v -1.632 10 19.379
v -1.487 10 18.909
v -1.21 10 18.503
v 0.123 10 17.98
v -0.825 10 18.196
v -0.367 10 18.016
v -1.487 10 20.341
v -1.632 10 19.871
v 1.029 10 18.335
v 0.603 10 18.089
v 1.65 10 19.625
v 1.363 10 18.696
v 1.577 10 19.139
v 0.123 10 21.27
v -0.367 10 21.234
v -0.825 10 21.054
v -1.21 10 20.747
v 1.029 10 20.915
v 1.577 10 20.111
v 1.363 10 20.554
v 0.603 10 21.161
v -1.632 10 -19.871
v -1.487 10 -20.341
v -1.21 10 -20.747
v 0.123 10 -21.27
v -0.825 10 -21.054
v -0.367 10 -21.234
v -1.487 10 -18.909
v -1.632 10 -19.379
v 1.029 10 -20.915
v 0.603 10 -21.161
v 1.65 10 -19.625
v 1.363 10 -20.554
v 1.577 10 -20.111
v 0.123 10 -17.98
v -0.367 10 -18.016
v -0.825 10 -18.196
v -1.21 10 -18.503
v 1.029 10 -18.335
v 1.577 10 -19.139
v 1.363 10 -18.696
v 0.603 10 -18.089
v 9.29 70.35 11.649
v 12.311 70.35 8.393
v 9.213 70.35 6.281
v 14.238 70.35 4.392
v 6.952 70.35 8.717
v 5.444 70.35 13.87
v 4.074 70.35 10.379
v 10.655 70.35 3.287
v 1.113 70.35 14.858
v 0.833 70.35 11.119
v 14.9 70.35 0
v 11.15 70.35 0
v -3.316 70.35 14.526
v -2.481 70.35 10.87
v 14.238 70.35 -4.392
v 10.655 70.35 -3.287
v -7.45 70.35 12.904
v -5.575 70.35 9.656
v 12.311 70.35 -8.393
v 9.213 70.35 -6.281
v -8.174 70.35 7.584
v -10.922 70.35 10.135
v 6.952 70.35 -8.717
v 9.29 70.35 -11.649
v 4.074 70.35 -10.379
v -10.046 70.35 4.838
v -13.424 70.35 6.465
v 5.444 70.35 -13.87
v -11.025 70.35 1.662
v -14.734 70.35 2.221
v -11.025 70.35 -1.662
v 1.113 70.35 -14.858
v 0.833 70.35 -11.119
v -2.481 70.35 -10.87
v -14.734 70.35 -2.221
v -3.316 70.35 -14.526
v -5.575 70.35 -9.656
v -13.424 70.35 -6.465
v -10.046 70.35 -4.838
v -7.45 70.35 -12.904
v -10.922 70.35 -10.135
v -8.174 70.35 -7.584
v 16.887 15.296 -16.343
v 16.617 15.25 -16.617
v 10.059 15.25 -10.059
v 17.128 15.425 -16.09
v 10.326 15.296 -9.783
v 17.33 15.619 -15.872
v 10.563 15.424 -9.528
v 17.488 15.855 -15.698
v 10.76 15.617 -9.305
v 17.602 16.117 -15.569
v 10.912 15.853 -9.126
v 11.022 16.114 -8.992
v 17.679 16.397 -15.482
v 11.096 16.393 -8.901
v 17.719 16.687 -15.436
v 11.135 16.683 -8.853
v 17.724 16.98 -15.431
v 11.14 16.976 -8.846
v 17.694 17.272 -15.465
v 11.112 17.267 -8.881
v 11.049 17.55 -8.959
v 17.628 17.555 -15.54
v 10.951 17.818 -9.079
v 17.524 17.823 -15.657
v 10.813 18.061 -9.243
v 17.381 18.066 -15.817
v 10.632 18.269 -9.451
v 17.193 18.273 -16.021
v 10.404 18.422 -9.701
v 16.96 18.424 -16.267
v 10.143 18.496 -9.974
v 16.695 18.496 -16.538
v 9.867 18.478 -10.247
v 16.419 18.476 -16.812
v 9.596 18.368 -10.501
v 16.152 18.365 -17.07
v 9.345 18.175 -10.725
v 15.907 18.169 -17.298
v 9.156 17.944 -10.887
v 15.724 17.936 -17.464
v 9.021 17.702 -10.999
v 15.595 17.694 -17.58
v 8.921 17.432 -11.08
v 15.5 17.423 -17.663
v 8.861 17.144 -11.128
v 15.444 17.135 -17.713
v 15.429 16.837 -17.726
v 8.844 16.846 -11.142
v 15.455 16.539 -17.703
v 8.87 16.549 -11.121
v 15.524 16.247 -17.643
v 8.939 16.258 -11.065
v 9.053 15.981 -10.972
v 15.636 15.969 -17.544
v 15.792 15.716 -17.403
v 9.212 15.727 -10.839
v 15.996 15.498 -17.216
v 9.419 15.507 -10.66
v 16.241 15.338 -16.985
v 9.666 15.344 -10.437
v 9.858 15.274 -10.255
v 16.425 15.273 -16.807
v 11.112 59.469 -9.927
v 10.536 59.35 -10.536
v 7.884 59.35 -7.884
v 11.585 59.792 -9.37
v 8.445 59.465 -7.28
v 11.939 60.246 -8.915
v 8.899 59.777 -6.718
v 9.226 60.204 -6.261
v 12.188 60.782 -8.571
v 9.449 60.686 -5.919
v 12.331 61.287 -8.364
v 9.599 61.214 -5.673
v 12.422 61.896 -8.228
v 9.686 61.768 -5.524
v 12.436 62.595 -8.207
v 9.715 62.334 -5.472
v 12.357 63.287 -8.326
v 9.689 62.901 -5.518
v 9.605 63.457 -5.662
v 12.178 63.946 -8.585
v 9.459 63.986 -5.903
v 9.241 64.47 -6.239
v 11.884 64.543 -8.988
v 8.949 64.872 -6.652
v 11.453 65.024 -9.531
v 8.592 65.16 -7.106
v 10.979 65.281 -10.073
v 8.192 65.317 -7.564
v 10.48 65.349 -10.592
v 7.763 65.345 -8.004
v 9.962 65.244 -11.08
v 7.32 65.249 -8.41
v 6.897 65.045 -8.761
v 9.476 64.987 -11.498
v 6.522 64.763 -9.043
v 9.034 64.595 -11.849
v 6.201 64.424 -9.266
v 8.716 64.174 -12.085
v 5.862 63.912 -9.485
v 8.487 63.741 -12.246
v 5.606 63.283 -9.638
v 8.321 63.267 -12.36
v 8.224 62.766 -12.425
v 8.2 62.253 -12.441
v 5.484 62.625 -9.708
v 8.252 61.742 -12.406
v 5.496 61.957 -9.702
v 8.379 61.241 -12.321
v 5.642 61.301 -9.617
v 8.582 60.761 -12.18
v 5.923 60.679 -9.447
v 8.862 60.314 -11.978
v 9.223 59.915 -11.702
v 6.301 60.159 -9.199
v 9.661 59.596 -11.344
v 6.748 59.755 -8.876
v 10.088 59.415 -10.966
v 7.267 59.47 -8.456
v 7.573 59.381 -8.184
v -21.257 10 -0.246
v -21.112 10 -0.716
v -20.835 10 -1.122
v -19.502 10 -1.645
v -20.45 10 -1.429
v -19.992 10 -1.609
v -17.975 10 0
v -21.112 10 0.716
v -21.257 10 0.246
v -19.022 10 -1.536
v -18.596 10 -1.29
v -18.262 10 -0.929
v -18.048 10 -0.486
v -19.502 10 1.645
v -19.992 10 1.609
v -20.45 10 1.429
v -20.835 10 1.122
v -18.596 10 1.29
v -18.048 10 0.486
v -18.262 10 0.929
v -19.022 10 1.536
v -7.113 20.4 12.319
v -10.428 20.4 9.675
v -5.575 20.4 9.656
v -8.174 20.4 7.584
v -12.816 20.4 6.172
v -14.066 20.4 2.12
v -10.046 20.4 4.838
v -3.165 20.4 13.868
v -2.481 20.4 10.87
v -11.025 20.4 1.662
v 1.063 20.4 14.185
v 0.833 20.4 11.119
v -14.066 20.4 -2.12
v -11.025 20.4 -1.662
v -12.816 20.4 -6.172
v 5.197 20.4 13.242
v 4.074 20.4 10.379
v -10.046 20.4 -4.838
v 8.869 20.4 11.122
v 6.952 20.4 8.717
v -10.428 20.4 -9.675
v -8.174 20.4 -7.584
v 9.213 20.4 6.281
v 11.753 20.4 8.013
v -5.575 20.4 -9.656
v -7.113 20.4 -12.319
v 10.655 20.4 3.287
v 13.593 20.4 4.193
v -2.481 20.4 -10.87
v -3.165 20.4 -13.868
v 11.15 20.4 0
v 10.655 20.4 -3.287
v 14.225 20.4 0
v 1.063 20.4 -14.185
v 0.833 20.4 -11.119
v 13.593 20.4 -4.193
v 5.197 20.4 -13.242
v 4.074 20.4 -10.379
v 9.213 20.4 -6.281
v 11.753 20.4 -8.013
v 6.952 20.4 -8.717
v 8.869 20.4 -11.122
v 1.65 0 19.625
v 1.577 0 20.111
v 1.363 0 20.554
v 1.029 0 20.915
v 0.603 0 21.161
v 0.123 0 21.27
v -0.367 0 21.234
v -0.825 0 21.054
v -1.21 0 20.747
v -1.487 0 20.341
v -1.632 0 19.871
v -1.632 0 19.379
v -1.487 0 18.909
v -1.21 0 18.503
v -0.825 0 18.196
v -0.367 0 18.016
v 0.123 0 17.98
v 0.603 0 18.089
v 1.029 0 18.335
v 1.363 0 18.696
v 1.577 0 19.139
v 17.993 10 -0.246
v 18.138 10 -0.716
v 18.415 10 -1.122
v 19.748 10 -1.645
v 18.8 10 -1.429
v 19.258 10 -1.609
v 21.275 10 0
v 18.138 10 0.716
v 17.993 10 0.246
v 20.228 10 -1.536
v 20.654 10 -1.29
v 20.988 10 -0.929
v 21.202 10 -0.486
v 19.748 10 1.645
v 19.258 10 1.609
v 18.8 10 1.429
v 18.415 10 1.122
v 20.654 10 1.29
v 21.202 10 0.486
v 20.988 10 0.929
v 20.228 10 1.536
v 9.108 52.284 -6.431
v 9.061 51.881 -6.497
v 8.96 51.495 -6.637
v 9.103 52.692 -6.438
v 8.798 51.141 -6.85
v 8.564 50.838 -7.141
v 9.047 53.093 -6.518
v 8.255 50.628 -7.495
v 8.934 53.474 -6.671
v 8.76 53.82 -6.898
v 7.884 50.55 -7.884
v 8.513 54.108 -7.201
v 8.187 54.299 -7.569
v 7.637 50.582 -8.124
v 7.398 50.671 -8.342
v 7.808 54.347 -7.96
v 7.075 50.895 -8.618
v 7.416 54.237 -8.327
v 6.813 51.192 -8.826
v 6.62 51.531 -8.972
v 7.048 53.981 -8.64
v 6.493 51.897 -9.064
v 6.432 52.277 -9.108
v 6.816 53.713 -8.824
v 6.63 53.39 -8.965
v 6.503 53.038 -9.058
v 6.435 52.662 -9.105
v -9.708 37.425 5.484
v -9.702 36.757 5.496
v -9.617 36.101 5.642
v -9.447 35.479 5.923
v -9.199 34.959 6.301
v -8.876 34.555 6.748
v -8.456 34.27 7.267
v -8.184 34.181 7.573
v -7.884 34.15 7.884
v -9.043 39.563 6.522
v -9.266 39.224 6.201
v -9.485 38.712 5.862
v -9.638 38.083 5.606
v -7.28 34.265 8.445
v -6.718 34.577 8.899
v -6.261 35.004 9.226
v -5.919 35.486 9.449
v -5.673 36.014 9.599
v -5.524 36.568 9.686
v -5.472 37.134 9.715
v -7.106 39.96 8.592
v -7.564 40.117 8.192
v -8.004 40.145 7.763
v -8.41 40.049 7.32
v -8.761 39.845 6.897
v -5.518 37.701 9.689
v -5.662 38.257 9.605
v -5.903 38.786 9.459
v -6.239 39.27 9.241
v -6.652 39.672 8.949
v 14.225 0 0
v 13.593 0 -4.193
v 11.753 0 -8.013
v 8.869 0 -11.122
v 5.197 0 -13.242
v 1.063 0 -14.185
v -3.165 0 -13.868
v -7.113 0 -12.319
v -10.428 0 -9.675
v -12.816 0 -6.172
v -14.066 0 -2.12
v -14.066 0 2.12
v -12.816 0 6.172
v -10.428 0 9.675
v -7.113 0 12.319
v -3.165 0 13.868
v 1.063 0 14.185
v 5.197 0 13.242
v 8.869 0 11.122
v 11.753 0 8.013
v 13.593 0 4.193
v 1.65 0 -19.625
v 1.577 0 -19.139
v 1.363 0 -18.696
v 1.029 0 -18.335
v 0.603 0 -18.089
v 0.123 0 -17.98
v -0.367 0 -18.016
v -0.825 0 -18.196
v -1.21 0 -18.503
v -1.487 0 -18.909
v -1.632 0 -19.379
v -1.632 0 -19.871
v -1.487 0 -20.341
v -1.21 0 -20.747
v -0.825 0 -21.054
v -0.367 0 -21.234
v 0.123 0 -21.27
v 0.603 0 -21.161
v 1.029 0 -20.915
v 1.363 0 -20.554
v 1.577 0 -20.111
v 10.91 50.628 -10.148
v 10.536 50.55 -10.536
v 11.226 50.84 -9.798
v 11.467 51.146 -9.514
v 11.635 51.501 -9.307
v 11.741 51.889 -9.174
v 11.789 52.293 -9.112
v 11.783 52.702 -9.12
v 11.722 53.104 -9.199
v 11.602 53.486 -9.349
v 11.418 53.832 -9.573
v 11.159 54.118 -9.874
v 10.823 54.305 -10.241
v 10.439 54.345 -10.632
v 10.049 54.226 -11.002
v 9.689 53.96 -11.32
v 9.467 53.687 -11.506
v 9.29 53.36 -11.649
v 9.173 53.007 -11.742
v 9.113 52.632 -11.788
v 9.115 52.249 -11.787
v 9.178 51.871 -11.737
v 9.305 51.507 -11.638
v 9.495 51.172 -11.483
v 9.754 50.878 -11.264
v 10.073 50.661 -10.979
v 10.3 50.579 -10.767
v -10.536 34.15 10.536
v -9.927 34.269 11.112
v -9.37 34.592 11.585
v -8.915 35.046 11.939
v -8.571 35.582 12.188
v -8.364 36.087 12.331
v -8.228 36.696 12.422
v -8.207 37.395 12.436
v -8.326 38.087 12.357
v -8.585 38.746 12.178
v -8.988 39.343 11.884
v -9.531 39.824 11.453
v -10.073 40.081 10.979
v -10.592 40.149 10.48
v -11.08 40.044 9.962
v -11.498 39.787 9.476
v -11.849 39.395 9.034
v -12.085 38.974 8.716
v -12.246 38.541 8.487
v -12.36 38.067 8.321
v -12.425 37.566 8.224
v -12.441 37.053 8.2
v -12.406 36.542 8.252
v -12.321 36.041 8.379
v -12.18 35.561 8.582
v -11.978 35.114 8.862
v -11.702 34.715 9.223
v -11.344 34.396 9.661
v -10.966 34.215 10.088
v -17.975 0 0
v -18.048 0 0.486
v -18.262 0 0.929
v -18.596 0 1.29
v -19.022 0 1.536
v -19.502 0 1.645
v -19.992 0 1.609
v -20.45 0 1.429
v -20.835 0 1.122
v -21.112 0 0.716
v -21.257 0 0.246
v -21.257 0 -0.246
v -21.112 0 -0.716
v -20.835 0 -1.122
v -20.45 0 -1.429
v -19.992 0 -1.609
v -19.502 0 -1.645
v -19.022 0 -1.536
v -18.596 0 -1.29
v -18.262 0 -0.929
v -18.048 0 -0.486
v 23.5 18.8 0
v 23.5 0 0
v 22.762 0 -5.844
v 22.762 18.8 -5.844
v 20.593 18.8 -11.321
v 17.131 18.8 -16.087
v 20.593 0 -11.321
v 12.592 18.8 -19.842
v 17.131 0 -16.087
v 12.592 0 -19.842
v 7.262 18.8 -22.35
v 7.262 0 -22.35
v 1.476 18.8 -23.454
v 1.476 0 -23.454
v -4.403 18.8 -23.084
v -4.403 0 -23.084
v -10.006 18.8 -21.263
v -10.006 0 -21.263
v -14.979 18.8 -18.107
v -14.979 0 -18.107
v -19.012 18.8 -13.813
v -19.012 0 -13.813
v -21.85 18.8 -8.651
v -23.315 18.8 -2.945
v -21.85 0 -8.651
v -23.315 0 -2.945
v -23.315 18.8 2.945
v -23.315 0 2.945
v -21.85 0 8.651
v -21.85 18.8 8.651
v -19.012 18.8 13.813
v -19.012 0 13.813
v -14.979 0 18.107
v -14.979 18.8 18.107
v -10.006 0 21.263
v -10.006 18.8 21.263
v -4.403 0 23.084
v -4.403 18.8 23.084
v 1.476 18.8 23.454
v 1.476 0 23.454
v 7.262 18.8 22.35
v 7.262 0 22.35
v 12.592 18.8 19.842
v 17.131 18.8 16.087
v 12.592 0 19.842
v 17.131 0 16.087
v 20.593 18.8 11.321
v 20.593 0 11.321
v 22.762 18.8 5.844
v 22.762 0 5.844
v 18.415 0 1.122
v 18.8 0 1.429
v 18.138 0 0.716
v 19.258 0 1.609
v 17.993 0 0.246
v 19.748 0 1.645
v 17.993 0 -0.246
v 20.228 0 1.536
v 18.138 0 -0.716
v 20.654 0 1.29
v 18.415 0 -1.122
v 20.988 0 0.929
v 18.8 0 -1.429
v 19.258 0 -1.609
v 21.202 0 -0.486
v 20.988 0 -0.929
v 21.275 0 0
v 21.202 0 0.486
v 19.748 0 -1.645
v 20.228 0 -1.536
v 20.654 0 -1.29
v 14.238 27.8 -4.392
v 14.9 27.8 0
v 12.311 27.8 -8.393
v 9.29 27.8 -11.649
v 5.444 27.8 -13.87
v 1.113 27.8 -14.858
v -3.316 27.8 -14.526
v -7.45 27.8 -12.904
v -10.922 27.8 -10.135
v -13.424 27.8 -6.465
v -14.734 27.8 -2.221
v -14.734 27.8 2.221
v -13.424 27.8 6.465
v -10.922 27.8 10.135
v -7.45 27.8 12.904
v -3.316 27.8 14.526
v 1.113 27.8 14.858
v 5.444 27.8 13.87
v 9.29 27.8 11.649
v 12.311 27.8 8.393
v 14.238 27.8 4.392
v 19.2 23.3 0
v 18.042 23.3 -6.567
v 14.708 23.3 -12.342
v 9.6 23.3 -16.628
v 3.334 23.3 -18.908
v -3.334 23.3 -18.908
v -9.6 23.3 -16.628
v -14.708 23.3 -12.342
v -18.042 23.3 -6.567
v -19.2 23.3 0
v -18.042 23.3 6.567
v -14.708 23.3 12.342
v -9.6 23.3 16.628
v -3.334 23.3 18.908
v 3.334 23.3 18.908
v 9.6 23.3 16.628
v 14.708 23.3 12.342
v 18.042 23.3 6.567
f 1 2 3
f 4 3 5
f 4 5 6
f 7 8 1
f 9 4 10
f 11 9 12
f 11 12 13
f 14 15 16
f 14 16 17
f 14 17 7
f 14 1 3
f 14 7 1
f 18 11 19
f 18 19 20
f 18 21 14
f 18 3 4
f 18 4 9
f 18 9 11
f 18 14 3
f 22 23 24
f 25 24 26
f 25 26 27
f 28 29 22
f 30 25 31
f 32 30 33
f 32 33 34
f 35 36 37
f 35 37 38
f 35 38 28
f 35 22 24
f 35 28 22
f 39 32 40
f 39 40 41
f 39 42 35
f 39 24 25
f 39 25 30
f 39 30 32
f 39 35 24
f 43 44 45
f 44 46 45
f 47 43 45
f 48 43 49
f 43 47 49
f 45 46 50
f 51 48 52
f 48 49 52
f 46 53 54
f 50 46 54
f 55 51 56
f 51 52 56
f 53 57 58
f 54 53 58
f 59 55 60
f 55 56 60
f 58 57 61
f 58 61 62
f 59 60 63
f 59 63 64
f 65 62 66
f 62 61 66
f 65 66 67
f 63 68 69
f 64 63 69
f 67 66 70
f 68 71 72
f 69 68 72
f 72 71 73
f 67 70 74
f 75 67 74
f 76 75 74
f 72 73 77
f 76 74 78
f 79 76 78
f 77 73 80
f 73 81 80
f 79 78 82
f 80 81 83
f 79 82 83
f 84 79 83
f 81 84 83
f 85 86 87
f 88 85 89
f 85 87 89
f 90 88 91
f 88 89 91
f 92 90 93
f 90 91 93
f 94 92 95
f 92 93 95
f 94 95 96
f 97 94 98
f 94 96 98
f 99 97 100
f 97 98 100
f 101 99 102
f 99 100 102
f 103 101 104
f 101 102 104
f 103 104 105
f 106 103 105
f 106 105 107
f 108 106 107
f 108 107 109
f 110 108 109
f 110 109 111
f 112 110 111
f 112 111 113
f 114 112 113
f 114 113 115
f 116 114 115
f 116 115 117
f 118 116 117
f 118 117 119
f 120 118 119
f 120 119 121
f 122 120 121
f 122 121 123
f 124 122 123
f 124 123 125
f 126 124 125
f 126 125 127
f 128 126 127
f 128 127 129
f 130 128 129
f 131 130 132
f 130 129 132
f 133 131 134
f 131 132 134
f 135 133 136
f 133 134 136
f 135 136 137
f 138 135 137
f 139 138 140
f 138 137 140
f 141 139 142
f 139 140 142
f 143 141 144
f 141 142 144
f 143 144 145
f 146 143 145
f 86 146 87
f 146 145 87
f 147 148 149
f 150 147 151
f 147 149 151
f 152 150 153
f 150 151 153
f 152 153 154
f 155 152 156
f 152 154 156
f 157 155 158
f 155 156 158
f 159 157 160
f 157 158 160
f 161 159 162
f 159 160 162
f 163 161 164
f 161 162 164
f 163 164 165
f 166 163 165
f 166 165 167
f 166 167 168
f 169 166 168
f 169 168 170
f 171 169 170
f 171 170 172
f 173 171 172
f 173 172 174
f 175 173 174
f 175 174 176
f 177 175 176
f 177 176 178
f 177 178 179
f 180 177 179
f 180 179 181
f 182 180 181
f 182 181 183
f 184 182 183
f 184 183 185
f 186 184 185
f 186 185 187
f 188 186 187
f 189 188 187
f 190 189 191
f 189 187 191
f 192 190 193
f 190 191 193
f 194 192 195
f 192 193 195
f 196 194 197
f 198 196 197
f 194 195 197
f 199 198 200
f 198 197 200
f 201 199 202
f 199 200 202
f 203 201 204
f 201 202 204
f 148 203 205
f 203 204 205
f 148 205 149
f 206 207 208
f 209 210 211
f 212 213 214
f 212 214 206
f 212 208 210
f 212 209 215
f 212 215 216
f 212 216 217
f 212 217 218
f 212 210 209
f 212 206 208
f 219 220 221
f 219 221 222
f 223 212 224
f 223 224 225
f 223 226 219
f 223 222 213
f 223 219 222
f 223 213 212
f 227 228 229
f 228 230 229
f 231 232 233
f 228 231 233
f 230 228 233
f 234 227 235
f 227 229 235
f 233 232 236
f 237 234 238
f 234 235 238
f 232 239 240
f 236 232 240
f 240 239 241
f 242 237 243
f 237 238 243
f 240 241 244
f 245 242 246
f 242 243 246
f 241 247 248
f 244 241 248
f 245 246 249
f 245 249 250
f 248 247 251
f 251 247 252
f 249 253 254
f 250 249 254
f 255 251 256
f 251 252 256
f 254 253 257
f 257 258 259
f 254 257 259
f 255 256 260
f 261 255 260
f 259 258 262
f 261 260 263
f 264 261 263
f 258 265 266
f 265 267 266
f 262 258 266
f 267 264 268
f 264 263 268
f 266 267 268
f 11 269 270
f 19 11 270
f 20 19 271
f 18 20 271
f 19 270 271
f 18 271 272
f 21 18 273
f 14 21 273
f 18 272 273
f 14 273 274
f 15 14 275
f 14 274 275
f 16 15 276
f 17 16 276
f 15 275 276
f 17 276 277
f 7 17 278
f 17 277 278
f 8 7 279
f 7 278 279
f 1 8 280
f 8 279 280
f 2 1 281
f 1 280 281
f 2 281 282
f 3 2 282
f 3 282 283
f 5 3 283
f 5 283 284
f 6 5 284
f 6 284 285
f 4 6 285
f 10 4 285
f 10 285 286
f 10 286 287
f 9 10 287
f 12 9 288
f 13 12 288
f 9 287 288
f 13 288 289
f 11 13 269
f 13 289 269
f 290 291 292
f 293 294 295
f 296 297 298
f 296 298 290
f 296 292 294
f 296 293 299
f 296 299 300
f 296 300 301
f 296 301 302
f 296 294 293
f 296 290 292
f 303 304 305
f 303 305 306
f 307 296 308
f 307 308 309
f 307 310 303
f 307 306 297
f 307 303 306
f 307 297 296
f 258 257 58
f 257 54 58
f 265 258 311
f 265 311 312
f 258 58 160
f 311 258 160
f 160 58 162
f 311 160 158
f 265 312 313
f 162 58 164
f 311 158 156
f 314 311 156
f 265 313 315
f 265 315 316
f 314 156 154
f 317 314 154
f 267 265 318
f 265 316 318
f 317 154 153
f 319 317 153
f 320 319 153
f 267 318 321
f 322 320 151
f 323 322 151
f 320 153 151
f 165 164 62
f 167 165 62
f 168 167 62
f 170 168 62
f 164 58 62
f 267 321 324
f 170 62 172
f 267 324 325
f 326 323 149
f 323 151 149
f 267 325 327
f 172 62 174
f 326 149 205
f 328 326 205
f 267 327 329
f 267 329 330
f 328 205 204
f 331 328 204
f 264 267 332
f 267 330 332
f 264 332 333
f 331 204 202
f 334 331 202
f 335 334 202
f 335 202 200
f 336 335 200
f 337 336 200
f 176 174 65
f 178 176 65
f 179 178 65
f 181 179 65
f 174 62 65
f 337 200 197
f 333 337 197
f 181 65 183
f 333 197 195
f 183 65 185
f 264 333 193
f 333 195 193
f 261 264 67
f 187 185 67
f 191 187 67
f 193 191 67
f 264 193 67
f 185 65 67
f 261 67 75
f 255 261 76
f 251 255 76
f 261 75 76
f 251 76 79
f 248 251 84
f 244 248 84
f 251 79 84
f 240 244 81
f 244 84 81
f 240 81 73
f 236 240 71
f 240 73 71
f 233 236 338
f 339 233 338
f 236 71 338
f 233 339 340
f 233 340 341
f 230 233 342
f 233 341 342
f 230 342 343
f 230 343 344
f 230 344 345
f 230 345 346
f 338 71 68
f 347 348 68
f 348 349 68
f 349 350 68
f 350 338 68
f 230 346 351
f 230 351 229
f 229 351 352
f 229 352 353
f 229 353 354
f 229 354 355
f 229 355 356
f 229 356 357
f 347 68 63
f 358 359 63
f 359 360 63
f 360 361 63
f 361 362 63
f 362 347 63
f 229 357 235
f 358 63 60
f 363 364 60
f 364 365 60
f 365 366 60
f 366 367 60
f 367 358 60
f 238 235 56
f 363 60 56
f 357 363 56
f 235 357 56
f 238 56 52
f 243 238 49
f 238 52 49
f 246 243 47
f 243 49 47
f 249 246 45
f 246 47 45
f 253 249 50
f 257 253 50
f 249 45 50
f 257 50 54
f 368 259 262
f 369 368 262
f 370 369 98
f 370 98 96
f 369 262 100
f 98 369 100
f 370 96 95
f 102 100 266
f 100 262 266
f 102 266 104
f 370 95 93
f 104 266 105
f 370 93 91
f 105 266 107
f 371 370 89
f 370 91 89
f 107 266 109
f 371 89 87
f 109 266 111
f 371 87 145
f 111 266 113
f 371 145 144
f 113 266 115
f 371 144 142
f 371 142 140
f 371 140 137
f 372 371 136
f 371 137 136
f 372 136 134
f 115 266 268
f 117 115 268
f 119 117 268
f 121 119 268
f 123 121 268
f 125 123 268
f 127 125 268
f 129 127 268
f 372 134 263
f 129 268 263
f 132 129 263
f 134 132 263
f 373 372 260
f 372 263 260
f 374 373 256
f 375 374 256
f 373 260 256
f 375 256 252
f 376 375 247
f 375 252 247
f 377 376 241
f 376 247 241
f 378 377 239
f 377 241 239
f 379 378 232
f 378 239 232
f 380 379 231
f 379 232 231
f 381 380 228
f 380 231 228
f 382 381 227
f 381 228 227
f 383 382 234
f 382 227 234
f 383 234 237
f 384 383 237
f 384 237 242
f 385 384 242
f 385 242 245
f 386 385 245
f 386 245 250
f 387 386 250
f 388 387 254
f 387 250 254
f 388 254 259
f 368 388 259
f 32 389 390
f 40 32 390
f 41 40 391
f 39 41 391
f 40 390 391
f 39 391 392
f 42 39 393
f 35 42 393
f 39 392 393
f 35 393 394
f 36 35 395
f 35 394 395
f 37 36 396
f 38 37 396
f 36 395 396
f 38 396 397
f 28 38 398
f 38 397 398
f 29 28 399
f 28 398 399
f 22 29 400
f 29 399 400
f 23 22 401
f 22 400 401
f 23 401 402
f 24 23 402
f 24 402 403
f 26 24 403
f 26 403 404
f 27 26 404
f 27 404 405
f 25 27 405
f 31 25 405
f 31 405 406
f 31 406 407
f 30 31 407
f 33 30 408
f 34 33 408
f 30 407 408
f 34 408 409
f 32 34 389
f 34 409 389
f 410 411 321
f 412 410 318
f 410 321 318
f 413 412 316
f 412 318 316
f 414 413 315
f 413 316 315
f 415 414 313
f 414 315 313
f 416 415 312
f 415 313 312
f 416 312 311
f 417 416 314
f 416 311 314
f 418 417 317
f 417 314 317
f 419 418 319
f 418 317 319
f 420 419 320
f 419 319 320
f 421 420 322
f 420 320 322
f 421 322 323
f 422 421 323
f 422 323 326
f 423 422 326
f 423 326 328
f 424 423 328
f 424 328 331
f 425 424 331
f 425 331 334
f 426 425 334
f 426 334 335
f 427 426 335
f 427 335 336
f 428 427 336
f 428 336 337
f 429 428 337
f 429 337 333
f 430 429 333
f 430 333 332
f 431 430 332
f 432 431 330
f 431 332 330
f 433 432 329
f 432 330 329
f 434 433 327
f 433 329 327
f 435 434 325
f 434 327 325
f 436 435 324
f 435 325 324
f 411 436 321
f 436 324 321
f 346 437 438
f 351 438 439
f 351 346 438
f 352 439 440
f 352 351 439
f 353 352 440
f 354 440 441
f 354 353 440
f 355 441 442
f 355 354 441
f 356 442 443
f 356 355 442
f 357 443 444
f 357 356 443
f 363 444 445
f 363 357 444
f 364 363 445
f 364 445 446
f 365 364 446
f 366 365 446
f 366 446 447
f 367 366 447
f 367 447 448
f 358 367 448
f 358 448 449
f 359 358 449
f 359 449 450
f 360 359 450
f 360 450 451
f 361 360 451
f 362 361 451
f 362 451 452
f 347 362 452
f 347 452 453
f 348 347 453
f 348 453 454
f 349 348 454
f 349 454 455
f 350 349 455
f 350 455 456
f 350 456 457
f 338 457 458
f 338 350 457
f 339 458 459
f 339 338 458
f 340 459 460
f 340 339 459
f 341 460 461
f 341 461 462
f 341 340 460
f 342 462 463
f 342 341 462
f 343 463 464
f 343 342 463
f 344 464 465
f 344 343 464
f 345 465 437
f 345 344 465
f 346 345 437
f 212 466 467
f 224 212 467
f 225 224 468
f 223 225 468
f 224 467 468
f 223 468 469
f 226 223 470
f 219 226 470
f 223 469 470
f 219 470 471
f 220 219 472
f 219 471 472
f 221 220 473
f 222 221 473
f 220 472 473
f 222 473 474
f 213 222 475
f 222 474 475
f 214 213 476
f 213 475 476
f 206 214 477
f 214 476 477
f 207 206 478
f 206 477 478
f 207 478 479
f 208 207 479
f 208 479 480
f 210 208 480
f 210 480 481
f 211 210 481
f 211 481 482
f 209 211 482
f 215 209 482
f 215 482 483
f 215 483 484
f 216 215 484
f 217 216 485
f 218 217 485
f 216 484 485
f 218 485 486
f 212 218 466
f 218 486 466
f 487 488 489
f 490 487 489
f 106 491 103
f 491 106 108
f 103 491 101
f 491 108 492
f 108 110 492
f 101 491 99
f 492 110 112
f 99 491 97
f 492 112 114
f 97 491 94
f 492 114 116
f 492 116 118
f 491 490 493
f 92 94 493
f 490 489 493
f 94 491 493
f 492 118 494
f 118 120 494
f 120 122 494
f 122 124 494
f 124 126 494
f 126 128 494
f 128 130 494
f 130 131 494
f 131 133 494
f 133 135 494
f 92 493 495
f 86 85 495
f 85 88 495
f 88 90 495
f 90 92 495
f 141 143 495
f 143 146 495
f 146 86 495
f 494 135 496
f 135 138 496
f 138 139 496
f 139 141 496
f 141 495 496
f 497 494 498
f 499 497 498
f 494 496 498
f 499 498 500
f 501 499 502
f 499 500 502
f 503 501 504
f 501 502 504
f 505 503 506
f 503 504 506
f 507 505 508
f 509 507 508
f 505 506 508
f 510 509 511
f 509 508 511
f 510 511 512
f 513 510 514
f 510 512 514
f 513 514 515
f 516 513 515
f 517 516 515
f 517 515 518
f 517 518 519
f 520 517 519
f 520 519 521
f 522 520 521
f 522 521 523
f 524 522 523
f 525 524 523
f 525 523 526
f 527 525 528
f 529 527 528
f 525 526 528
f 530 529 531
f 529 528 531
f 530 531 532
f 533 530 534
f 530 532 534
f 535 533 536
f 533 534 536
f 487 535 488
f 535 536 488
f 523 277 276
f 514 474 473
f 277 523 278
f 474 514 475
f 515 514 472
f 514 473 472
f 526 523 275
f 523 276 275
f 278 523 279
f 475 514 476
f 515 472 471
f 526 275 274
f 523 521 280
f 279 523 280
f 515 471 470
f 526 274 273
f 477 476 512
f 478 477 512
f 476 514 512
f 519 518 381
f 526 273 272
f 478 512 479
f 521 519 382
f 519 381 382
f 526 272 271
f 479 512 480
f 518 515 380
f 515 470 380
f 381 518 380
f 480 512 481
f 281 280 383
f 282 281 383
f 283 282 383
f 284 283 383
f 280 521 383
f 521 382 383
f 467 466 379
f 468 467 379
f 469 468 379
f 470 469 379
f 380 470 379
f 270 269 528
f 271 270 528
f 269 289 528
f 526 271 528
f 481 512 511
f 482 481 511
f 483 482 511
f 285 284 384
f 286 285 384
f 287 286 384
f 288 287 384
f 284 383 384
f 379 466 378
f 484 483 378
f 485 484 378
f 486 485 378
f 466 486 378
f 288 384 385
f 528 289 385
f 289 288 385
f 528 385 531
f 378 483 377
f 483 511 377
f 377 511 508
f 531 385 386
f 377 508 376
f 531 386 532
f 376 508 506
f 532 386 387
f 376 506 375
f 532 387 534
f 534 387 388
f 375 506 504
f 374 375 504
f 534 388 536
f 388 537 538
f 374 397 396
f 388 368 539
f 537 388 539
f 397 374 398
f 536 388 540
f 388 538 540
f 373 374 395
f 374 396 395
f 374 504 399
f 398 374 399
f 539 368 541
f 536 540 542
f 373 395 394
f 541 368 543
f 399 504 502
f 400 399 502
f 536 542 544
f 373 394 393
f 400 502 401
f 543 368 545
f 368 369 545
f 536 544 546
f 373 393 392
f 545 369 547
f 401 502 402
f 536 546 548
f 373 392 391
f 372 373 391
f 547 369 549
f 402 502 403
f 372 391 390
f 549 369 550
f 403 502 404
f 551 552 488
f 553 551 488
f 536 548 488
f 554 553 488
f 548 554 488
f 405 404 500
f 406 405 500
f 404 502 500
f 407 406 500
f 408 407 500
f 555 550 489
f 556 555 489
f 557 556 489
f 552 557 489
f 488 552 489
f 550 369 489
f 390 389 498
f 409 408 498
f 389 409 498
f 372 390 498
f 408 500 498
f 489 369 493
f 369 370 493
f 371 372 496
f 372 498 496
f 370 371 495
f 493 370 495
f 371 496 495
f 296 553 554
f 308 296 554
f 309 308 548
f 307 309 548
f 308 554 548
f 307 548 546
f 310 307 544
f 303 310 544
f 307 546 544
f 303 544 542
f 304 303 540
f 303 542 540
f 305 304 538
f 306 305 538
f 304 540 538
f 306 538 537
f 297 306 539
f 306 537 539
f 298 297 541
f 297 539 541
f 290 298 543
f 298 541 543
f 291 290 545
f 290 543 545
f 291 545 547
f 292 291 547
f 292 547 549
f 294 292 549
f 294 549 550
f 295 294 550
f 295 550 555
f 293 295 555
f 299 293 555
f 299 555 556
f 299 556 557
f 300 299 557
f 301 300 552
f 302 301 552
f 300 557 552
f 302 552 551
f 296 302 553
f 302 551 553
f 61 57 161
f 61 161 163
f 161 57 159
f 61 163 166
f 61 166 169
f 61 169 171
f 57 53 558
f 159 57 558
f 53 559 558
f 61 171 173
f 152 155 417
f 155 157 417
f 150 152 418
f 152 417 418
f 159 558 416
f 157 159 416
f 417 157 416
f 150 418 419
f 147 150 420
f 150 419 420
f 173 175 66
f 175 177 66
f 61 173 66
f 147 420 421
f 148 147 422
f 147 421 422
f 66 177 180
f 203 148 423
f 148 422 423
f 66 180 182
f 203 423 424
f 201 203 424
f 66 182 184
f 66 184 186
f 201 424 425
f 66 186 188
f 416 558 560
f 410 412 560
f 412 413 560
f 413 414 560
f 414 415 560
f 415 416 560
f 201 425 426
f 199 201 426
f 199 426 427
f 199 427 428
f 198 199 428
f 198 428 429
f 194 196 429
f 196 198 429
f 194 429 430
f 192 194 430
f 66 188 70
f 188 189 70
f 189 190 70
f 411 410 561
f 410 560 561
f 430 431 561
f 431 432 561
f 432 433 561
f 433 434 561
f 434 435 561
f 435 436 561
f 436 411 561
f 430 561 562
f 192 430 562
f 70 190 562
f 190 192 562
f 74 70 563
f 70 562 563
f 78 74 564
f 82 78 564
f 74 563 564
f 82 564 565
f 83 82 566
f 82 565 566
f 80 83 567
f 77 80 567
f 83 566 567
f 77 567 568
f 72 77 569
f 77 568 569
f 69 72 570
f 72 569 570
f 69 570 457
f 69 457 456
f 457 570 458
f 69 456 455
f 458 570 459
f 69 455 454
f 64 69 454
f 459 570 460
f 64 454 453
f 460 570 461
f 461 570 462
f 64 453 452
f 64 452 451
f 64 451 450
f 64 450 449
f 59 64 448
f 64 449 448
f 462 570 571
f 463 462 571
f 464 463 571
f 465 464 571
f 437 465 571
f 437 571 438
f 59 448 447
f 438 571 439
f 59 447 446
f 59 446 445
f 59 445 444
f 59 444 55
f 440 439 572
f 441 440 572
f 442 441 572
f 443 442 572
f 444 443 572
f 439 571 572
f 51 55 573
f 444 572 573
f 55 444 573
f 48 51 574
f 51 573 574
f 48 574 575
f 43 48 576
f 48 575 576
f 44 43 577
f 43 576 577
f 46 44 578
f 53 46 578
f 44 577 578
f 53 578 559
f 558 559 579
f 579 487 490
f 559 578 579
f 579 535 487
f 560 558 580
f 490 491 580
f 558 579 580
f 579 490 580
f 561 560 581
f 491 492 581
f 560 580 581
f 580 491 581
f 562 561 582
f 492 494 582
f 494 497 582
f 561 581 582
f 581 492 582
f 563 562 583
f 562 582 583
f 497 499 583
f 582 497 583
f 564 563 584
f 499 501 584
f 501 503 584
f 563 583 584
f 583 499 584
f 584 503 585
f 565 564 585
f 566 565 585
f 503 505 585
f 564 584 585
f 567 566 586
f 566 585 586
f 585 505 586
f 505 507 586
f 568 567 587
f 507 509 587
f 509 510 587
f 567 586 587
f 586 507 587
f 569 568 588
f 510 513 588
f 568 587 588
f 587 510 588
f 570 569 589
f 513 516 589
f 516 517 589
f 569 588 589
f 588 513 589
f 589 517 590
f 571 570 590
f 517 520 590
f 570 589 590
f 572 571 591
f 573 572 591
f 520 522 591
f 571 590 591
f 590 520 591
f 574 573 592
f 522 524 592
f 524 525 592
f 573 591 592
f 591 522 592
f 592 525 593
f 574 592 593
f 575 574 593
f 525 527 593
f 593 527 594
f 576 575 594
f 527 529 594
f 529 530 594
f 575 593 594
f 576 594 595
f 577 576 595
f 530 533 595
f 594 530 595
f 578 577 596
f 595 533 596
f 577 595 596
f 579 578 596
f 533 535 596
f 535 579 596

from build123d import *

# Parameters (mm, degrees)
SKETCH2_R          = 1.65
CUT_EXTRUDE1_DEPTH = 10
SKETCH4_R          = 1.625
SKETCH4_R_2        = 3
SKETCH4_R_3        = 1.9
CUT_EXTRUDE2_DEPTH = 78.805028758
SKETCH4_3_R        = 3
CUT_EXTRUDE3_DEPTH = 78.805028909


with BuildPart() as part:
    # Sketch1 → Revolve1 (revolve)
    with BuildSketch(Plane.XY):
        Polygon((11.15, 20.4), (11.15, 70.35), (14.9, 70.35), (14.9, 27.8), (23.5, 18.8), (23.5, 0), (14.225, 0), (14.225, 20.4), align=None)
    revolve(axis=Axis((0, 0, 0), (0, 1, 0)))

    # Sketch2 → Cut-Extrude1 (cut)
    with BuildSketch(Plane.XZ):
        with Locations((0, 19.625)):
            Circle(SKETCH2_R)
        with Locations((0, -19.625)):
            Circle(SKETCH2_R)
        with Locations((-19.625, 0)):
            Circle(SKETCH2_R)
        with Locations((19.625, 0)):
            Circle(SKETCH2_R)
    extrude(amount=-CUT_EXTRUDE1_DEPTH, mode=Mode.SUBTRACT)

    # Sketch4 → Cut-Extrude2 (cut, through all)
    with BuildSketch(Plane(origin=(0, 0, 0), x_dir=(0, -1, 0), z_dir=(-0.7071067811865488, 0, 0.7071067811865464))):
        with Locations((-16.875, 0)):
            Circle(SKETCH4_R)
        with Locations((-62.35, 0)):
            Circle(SKETCH4_R_2)
        with Locations((-52.45, 0)):
            Circle(SKETCH4_R_3)
    extrude(amount=-CUT_EXTRUDE2_DEPTH, mode=Mode.SUBTRACT)

    # Sketch4<3> → Cut-Extrude3 (cut, through all)
    with BuildSketch(Plane(origin=(0, 0, 0), x_dir=(0, -1, 0), z_dir=(-0.7071067811865488, 0, 0.7071067811865464))):
        with Locations((-37.15, 0)):
            Circle(SKETCH4_3_R)
    extrude(amount=CUT_EXTRUDE3_DEPTH, mode=Mode.SUBTRACT)


solid = part.part
